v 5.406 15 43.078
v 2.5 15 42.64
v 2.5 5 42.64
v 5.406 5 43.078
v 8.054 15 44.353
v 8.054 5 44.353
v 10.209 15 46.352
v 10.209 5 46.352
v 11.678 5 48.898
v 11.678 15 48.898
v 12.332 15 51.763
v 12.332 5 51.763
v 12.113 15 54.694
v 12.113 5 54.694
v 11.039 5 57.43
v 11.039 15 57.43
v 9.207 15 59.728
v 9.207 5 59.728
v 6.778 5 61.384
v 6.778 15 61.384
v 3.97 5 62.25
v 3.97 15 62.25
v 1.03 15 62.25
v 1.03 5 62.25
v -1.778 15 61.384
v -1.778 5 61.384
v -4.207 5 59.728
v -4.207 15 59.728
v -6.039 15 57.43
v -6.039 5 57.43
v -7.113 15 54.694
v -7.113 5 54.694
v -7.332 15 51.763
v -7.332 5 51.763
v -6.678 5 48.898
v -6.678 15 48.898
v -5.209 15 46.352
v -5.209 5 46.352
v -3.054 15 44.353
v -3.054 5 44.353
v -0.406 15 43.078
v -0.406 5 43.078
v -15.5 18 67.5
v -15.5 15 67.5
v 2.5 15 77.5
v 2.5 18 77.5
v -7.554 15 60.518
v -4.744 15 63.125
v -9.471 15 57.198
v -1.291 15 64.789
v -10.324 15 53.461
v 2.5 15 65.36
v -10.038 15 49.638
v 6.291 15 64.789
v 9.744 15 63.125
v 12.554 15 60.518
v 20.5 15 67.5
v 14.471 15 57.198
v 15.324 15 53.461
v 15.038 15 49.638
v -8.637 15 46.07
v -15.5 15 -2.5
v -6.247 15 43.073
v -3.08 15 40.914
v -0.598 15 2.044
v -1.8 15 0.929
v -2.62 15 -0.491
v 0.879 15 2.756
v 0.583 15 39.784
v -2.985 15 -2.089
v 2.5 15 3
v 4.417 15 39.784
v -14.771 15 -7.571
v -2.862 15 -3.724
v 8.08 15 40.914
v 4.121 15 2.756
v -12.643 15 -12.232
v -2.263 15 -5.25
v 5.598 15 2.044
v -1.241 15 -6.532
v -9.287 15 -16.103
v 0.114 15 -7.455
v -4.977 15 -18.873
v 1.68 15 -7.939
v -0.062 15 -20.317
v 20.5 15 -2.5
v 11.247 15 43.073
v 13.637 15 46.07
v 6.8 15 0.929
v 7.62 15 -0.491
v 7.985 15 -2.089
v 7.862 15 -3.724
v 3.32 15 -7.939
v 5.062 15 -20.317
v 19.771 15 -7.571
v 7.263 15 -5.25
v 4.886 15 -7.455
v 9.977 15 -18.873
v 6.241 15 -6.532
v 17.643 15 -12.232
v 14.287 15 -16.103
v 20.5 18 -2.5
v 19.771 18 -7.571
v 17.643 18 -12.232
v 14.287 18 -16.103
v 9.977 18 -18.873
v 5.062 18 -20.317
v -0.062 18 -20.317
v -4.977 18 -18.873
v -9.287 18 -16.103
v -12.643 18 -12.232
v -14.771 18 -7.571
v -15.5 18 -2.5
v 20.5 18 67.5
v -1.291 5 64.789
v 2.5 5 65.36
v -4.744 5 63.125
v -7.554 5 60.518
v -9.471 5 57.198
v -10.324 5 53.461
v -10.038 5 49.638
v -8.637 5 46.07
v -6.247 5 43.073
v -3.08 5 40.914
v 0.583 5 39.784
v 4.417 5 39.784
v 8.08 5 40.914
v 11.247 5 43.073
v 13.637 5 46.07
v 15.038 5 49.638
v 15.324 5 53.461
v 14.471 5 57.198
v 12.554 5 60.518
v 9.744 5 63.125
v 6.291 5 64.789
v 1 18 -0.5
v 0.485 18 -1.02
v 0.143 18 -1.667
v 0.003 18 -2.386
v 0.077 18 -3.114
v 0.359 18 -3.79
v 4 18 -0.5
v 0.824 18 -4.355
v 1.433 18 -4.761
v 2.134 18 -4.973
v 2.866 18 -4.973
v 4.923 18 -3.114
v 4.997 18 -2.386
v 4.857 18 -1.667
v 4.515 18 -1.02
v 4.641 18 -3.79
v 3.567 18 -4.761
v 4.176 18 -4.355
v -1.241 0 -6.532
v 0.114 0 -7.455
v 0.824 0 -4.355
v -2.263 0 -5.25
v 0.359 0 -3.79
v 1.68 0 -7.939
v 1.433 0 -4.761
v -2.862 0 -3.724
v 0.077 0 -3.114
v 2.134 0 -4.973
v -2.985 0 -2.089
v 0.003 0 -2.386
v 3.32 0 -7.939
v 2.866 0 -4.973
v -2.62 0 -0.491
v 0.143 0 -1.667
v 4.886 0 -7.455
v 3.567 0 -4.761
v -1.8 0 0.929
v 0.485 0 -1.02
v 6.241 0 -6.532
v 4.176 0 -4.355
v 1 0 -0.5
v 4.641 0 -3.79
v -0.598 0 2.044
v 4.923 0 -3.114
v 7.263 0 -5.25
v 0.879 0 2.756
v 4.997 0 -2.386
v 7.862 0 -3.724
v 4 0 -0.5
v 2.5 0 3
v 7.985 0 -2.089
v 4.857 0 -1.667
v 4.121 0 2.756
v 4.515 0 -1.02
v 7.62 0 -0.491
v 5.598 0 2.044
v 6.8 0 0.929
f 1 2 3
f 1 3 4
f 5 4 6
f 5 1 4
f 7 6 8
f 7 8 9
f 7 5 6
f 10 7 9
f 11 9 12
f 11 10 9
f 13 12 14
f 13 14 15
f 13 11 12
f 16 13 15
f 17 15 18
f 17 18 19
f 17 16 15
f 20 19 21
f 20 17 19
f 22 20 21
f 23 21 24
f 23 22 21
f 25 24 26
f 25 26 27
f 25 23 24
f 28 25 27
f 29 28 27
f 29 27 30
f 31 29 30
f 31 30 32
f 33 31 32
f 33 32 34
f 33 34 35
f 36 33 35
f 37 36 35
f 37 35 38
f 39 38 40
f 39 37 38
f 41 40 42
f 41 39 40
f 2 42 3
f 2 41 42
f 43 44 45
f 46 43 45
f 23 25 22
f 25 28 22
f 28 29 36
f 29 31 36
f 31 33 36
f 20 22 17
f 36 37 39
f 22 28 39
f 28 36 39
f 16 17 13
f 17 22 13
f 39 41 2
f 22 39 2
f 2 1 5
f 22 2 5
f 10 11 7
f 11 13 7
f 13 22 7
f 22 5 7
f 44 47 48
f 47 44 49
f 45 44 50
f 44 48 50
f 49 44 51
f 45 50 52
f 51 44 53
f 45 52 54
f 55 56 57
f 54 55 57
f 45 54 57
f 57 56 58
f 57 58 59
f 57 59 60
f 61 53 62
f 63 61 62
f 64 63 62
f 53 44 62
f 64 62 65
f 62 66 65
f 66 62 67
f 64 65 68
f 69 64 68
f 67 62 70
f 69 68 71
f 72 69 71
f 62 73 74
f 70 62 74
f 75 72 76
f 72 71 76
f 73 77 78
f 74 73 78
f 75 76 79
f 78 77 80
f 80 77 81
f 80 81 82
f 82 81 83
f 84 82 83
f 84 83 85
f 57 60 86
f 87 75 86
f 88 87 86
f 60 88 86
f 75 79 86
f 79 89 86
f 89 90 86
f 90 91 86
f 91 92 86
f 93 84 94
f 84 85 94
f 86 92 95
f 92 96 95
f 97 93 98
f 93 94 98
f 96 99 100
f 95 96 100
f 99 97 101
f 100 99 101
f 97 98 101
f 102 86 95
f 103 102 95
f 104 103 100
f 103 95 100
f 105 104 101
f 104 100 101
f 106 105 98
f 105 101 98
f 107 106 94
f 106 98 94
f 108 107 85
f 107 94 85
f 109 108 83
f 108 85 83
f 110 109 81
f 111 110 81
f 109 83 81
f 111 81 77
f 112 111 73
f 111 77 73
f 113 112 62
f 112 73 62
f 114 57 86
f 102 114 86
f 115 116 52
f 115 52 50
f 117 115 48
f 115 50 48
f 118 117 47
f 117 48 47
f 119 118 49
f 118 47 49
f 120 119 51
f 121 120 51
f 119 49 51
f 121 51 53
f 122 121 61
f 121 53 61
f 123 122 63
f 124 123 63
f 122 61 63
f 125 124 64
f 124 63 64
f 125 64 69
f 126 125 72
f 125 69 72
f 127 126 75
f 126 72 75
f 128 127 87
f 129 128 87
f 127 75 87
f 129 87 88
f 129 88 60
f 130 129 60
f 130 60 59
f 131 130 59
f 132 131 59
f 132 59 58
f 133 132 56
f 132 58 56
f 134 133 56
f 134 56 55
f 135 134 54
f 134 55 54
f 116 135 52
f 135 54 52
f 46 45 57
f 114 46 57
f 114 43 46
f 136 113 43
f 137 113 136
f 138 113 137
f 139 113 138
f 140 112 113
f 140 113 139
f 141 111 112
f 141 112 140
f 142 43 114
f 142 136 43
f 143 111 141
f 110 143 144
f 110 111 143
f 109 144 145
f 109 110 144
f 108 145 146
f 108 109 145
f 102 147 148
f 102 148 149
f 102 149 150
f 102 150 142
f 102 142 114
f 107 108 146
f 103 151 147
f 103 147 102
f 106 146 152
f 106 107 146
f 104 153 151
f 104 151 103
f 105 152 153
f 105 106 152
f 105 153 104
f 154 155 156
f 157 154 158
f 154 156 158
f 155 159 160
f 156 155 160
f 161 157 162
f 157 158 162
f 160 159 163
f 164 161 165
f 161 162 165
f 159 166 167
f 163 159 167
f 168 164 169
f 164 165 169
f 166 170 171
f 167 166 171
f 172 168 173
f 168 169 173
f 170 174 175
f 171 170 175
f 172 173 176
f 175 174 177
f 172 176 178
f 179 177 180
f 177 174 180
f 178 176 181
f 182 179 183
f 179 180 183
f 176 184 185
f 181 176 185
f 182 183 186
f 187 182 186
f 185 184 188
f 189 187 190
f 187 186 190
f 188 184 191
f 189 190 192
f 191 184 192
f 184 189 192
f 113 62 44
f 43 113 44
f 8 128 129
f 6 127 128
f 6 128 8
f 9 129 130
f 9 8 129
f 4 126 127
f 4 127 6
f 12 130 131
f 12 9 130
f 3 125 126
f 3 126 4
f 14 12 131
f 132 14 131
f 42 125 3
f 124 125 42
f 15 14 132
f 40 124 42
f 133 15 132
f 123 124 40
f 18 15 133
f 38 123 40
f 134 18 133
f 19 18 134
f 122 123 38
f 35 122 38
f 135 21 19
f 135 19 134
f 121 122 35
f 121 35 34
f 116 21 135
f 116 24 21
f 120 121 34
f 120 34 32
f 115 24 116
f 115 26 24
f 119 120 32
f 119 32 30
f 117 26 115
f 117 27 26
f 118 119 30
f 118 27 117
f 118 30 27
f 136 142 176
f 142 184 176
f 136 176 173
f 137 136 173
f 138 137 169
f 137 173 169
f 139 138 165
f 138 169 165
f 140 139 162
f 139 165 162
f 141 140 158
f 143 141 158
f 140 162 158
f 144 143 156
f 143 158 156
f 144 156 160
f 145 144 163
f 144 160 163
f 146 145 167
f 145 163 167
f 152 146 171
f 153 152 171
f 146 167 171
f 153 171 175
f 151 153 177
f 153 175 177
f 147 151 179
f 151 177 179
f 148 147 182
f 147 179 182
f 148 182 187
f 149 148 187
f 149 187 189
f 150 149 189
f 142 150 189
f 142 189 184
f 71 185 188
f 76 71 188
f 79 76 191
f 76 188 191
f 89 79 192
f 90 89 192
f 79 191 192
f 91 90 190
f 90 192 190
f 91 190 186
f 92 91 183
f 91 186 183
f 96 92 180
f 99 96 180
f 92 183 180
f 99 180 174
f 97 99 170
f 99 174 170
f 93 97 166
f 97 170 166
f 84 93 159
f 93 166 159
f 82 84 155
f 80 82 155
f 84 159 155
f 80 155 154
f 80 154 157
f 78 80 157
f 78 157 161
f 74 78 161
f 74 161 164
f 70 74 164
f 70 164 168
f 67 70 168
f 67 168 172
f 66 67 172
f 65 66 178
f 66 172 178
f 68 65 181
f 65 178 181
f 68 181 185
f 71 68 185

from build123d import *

# Parameters (mm, degrees)
SKETCH1_R           = 5.5
BOSS_EXTRUDE1_DEPTH = 15
SKETCH2_R           = 18
SKETCH2_R_2         = 5.5
BOSS_EXTRUDE3_DEPTH = 3
SKETCH3_R           = 12.86
SKETCH3_R_2         = 9.86
BOSS_EXTRUDE4_DEPTH = 10


with BuildPart() as part:
    # Sketch1 → Boss-Extrude1 (new body)
    with BuildSketch(Plane(origin=(0, 0, 0), x_dir=(1, 0, 0), z_dir=(0, 1, 0))):
        with Locations(Location((2.5, 2.5, 0), (0, 0, 270))):
            Circle(SKETCH1_R)
        with BuildLine():
            Line((4, 0.5), (1, 0.5))
            ThreePointArc((1, 0.5), (2.5, 5), (4, 0.5))
        make_face(mode=Mode.SUBTRACT)
    extrude(amount=BOSS_EXTRUDE1_DEPTH)

    # Sketch2 → Boss-Extrude3 (add)
    with BuildSketch(Plane(origin=(0, 15, 0), x_dir=(1, 0, 0), z_dir=(0, 1, 0))):
        with Locations((2.5, 2.5)):
            Circle(SKETCH2_R)
        with Locations(Location((2.5, 2.5, 0), (0, 0, 270))):
            Circle(SKETCH2_R_2, mode=Mode.SUBTRACT)
        with Locations(Location((2.5, 2.5, 0), (0, 0, 270))):
            Circle(SKETCH2_R_2)
        with BuildLine():
            Line((4, 0.5), (1, 0.5))
            ThreePointArc((1, 0.5), (2.5, 5), (4, 0.5))
        make_face(mode=Mode.SUBTRACT)
        with BuildLine():
            ThreePointArc((20.5, 2.5), (2.5, -15.5), (-15.5, 2.5))
            Line((-15.5, 2.5), (-15.5, -67.5))
            Line((-15.5, -67.5), (2.5, -77.5))
            Line((2.5, -77.5), (20.5, -67.5))
            Line((20.5, -67.5), (20.5, 2.5))
        make_face()
    extrude(amount=BOSS_EXTRUDE3_DEPTH)

    # Sketch3 → Boss-Extrude4 (add)
    with BuildSketch(Plane.XZ.offset(-15)):
        with Locations(Location((2.5, 52.5, 0), (0, 0, 90))):
            Circle(SKETCH3_R)
        with Locations(Location((2.5, 52.5, 0), (0, 0, 270))):
            Circle(SKETCH3_R_2, mode=Mode.SUBTRACT)
    extrude(amount=BOSS_EXTRUDE4_DEPTH)


solid = part.part
